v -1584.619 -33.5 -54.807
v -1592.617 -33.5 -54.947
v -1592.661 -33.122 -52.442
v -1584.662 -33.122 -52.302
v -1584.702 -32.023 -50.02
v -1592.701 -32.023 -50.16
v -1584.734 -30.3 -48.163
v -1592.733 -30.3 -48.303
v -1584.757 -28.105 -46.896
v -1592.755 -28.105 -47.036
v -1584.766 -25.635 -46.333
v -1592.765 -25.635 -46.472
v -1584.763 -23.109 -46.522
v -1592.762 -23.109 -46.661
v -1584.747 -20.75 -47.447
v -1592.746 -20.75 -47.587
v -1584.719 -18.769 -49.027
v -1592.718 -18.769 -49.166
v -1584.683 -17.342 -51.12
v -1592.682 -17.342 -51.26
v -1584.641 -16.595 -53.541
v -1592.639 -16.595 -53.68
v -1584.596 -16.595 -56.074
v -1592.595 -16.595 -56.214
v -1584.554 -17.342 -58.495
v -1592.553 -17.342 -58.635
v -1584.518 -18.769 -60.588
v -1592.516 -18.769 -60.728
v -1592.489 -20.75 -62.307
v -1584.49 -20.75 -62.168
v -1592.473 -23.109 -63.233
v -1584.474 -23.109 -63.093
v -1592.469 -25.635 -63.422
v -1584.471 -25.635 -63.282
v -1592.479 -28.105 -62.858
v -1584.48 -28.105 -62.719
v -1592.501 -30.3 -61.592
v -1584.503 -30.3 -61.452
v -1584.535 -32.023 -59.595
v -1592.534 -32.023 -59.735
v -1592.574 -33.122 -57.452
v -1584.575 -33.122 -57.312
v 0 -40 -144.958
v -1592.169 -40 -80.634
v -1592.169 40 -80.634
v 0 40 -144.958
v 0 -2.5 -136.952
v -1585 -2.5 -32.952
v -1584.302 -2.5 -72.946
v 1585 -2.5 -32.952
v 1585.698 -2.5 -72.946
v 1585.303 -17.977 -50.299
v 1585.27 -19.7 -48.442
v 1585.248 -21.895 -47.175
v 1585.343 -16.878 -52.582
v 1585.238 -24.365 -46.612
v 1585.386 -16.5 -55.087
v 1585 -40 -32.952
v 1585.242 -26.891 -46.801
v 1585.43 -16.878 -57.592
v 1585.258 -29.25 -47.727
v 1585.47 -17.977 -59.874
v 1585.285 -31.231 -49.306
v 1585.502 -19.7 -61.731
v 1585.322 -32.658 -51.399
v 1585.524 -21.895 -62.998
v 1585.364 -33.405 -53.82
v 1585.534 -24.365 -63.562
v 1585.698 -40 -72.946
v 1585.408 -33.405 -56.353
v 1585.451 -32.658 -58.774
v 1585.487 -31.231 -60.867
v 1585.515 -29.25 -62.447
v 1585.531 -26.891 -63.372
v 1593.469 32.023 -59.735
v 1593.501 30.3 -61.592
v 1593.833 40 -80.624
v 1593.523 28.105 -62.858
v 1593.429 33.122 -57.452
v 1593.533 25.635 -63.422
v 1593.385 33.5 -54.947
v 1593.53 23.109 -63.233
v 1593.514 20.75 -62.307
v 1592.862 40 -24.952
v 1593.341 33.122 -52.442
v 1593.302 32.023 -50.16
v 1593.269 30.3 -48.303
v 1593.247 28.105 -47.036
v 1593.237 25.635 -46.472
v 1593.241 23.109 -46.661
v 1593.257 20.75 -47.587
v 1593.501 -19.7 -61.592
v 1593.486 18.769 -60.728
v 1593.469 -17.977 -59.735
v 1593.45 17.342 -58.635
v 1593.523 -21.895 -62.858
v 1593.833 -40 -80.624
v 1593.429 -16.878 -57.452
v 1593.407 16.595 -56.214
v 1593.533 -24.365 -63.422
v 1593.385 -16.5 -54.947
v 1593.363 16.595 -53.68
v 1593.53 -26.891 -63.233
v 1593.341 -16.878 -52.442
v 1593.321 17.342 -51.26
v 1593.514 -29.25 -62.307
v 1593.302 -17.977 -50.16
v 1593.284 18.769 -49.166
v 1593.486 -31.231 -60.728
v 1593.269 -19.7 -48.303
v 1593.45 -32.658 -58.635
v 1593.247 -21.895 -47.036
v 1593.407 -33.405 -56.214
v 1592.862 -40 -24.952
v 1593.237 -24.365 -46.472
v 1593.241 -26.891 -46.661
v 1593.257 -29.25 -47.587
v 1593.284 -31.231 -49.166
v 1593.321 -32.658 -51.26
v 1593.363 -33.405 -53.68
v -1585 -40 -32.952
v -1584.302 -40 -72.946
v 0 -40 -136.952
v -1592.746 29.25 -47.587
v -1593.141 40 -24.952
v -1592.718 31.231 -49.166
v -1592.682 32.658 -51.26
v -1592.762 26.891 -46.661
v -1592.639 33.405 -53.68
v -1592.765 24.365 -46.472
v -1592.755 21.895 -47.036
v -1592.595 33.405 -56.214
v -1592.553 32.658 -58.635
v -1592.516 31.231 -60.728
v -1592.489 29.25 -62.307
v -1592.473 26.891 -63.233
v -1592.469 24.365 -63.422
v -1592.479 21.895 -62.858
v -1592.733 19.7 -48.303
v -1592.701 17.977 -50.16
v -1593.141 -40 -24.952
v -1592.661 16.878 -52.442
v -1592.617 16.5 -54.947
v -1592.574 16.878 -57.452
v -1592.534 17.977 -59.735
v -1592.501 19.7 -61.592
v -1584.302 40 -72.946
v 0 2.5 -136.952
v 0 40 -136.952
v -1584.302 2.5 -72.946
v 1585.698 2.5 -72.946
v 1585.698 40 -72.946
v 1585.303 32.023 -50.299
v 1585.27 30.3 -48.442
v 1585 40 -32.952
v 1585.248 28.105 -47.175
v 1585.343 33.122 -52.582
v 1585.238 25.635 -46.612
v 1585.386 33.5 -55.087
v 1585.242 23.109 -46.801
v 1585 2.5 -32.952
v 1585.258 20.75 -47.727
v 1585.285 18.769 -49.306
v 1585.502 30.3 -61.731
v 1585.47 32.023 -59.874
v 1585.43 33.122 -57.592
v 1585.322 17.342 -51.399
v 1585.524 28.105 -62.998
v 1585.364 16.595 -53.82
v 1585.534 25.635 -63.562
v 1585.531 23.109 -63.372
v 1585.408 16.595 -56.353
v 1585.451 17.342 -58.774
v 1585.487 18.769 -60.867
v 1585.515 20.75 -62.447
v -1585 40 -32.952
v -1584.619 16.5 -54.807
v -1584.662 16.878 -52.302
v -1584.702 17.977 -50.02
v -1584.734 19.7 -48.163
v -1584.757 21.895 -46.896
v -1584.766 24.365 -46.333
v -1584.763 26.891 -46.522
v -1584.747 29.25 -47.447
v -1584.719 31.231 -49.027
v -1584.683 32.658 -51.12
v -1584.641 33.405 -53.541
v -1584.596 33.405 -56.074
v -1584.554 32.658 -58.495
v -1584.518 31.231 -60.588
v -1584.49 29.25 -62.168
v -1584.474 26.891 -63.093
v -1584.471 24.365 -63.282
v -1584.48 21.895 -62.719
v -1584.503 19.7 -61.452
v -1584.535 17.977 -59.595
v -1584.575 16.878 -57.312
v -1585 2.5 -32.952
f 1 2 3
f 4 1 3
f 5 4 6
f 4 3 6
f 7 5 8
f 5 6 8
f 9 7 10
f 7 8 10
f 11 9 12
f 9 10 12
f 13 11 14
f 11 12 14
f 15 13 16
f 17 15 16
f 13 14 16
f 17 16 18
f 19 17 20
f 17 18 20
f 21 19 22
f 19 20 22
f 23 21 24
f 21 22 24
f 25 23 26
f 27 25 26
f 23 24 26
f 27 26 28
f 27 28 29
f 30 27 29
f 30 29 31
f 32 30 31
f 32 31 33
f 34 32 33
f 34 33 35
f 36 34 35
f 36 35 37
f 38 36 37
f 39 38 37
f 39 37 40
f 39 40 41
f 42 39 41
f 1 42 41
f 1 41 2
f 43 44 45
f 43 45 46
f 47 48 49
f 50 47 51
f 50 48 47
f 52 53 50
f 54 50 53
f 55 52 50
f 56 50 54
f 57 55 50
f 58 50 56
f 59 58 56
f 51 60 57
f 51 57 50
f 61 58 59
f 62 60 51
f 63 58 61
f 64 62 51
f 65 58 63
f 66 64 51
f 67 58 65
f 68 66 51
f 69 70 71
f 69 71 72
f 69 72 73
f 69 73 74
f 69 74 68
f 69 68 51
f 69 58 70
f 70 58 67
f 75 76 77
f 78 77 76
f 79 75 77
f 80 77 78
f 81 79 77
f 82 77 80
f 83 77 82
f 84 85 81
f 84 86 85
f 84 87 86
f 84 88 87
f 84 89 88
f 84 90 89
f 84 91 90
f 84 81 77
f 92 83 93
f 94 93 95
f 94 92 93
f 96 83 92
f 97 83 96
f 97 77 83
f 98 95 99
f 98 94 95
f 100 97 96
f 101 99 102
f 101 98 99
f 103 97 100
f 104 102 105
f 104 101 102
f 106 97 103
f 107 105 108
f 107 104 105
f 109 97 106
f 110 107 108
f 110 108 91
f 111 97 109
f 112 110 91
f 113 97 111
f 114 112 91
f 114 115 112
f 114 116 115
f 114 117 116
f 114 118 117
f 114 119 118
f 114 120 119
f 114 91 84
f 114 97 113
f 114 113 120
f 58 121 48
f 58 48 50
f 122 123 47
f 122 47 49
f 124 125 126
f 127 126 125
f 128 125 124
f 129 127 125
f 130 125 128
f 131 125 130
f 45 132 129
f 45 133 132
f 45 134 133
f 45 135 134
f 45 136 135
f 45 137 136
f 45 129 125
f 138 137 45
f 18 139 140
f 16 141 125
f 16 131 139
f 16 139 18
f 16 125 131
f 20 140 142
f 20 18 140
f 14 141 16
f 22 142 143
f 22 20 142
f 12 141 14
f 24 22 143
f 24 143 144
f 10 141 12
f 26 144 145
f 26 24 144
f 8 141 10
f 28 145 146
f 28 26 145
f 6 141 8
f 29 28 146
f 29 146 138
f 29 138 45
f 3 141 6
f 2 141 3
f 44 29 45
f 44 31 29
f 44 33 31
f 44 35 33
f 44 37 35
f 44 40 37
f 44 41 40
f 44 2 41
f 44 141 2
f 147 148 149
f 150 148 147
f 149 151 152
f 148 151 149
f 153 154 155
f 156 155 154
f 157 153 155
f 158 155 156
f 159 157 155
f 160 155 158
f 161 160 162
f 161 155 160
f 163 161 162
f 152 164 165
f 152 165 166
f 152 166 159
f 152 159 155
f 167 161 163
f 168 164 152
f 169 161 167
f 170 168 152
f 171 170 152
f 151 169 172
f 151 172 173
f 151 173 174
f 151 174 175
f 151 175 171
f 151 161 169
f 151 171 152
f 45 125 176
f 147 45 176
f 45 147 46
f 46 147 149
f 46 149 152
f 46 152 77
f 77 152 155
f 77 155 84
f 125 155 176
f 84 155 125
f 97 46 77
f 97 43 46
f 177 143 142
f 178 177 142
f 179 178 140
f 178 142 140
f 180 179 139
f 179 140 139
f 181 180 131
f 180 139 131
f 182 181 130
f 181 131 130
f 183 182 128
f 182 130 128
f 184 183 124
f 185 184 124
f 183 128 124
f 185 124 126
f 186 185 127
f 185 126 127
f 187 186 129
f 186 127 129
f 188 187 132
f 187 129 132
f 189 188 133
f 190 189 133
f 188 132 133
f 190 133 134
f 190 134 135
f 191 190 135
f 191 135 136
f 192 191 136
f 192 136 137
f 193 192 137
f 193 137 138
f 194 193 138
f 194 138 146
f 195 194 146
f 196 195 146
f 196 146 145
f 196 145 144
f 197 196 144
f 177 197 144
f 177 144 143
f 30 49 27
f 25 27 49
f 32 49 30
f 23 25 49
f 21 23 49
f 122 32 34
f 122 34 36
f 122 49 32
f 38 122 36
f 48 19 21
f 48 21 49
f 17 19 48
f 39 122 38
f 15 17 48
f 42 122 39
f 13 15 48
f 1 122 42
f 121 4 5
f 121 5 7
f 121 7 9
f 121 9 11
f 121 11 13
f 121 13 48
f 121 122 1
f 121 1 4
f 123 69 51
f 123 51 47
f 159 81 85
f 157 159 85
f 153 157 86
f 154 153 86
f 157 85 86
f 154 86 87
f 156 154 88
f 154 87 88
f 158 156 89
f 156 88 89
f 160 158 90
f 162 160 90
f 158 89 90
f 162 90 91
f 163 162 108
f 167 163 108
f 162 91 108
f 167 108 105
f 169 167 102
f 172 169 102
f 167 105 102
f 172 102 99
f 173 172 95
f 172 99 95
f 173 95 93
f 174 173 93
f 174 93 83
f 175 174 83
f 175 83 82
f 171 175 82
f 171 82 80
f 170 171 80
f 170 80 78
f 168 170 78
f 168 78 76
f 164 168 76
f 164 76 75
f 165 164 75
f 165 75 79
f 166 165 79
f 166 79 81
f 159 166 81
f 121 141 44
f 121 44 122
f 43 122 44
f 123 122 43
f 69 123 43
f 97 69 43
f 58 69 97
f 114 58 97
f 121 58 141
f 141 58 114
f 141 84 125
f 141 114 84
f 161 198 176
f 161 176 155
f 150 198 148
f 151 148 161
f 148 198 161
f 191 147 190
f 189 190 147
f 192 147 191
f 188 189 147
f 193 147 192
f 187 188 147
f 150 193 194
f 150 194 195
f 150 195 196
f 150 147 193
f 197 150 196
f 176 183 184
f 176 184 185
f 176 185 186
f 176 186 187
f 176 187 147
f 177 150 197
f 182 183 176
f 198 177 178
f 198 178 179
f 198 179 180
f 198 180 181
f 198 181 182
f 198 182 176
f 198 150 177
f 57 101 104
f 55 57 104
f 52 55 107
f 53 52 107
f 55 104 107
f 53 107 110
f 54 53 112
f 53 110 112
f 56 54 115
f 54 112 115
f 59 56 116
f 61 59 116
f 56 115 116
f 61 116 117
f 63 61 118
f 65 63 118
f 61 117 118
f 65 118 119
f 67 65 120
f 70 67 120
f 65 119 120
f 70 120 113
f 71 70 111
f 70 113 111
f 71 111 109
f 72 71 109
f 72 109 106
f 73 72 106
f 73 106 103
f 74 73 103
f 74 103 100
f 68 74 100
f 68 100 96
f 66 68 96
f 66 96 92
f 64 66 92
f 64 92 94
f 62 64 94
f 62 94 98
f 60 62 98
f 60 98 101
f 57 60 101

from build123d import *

# Parameters (mm, degrees)
F1_DEPTH = 2.5
F3_DEPTH = 40
F4_R     = 8.5
F5_DEPTH = 25
F6_R     = 8.5
F7_DEPTH = 25


with BuildPart() as f1:
    # F0 (on Front) → F1 (new body, symmetric)
    with BuildSketch(Plane.XZ):
        Polygon((1585, -32.951629775), (0, -32.951629775), (-1585, -32.951629775), (-1584.3019037425, -72.9455375812), (0, -136.951629775), (1585.6980962575, -72.9455375812), align=None)
    extrude(amount=F1_DEPTH, both=True)

    # F2 (on Front) → F3 (join, symmetric)
    with BuildSketch(Plane.XZ):
        Polygon((1592.8615781049, -24.951629775), (-1593.1408591438, -24.951629775), (-1592.1689156564, -80.6342348721), (0, -144.9581558134), (1593.8333374915, -80.6236877443), align=None)
        Polygon((-1584.3019037425, -72.9455375812), (-1585, -32.951629775), (1585, -32.951629775), (1585.6980962575, -72.9455375812), (0, -136.951629775), align=None, mode=Mode.SUBTRACT)
    extrude(amount=F3_DEPTH, both=True)

    # F4 (on face) → F5 (cut)
    with BuildSketch(Plane(origin=(-1593.0910096212, 0, -27.8075070095), x_dir=(0, -1, 0), z_dir=(-0.9998476952, 0, -0.0174524064))):
        with Locations((-25, -27.1436877353)):
            Circle(F4_R)
        with Locations((25, -27.1436877353)):
            Circle(F4_R)
    extrude(amount=-F5_DEPTH, mode=Mode.SUBTRACT)

    # F6 (on face) → F7 (cut)
    with BuildSketch(Plane(origin=(1591.9410143265, 0, 27.787433767), x_dir=(0, 1, 0), z_dir=(0.9998476952, 0, 0.0174524064))):
        with Locations((-25, -82.7470971803)):
            Circle(F6_R)
        with Locations((25, -82.7470971803)):
            Circle(F6_R)
    extrude(amount=-F7_DEPTH, mode=Mode.SUBTRACT)


solid = f1.part
